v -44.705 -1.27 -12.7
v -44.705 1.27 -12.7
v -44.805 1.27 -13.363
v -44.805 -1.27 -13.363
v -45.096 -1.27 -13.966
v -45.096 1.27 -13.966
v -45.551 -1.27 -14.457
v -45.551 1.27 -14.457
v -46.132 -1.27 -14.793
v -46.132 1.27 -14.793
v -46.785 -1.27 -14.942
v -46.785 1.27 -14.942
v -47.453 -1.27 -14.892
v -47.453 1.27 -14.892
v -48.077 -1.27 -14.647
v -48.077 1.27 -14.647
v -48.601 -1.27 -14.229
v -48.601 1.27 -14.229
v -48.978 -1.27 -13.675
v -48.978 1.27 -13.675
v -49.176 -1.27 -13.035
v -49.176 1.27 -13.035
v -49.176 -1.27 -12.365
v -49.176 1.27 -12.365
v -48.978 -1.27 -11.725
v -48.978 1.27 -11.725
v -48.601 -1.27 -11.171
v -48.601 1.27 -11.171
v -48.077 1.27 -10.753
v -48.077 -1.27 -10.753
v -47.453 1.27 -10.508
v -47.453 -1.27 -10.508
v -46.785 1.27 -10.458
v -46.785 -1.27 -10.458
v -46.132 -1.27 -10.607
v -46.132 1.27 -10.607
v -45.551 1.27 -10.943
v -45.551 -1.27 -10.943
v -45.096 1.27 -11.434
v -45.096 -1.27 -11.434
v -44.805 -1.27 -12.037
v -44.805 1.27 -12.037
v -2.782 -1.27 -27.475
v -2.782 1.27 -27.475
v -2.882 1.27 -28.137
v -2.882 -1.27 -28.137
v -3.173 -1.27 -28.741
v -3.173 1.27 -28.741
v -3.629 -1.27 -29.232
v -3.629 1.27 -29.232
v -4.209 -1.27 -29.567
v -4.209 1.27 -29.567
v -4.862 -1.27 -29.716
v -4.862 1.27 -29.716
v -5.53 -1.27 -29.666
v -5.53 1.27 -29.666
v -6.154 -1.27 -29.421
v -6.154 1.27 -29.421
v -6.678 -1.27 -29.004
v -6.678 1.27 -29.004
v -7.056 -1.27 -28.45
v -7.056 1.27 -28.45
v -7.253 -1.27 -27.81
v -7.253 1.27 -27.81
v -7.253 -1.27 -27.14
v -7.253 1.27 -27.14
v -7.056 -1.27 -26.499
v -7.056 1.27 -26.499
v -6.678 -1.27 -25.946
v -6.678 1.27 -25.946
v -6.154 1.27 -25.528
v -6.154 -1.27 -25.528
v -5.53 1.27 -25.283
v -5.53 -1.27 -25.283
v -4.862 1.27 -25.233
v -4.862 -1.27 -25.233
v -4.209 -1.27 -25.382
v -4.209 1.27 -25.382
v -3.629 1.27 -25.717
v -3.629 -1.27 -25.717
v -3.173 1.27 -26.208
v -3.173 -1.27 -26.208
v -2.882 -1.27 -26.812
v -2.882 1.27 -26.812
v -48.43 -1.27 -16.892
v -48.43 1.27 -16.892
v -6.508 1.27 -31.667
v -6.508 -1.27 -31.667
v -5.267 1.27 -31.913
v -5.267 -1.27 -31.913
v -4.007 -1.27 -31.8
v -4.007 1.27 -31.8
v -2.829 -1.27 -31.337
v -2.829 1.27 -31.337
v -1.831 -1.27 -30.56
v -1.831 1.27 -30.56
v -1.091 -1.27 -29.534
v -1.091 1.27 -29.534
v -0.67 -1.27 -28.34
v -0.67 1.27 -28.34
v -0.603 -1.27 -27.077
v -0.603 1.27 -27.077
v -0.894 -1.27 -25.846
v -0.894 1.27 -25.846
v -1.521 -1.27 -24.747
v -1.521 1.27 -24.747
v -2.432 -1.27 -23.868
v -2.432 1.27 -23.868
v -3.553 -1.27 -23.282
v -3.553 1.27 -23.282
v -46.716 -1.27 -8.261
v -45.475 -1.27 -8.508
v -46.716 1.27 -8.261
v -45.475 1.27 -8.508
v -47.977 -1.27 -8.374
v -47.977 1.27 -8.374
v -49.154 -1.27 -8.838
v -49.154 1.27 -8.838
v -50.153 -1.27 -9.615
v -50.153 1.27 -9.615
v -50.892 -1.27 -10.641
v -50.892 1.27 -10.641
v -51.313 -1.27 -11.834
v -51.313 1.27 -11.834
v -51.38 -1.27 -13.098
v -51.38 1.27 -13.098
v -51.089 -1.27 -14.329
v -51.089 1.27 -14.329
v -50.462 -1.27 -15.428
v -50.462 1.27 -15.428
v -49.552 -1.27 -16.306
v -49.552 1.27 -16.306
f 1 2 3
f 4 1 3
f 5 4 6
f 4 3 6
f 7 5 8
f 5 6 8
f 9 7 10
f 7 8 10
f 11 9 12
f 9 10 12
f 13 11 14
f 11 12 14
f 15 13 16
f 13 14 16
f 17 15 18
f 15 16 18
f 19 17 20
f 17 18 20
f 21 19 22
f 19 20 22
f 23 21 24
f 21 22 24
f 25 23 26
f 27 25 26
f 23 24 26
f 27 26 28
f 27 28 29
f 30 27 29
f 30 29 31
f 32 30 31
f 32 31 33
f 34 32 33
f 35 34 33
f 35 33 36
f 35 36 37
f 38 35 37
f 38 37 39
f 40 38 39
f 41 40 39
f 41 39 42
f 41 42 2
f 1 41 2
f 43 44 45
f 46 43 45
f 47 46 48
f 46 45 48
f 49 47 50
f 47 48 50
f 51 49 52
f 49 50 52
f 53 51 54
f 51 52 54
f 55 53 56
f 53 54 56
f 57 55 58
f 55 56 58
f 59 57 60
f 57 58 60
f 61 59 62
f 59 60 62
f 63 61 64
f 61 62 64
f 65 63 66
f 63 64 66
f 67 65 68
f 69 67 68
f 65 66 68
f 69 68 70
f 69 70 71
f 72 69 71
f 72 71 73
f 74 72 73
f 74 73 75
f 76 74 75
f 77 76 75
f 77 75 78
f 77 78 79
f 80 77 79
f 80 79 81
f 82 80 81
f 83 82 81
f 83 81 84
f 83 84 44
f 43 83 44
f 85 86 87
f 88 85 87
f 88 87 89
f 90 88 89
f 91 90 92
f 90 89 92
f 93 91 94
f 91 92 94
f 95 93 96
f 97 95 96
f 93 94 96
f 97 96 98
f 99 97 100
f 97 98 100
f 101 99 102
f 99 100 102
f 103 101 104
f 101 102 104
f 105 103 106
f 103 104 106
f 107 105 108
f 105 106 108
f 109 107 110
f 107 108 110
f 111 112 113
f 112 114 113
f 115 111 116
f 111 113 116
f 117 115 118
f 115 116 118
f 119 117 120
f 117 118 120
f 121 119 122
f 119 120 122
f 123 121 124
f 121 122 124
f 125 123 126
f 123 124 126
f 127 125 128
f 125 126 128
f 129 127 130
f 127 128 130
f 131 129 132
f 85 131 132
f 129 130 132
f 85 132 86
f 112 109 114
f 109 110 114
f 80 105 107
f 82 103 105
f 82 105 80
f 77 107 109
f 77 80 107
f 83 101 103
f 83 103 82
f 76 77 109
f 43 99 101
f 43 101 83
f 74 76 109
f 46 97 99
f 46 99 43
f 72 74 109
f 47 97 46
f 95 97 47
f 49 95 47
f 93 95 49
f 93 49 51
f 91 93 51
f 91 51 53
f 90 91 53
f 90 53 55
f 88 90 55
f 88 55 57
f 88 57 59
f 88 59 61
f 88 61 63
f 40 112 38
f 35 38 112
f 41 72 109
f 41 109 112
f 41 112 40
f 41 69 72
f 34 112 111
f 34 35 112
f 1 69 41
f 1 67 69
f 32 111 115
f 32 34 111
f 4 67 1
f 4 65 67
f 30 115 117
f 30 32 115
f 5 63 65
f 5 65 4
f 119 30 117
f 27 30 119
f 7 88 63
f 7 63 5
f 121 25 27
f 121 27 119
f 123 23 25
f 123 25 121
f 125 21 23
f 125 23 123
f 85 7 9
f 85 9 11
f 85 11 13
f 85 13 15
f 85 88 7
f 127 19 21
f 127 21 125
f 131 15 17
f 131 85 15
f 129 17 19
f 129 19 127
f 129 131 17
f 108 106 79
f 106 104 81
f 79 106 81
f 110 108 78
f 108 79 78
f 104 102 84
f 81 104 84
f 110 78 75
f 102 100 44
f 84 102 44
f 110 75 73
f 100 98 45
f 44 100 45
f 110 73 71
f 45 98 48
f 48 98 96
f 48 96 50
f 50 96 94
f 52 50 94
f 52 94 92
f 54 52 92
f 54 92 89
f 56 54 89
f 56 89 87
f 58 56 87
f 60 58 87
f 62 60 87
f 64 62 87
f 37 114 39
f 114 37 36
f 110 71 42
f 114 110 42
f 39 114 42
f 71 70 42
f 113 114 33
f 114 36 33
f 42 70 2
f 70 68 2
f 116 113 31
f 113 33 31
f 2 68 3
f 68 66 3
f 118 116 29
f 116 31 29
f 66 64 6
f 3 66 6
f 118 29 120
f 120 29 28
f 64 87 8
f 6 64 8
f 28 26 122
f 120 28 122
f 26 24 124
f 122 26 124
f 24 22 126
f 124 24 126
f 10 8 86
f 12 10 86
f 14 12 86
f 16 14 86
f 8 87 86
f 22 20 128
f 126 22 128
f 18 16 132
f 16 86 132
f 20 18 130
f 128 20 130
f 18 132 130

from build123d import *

# Parameters (mm, degrees)
BOSS_EXTRUDE1_DEPTH = 1.27
CUT_EXTRUDE1_REACH  = 4.54
SKETCH3_R           = 2.2479


with BuildPart() as part:
    # Sketch2 → Boss-Extrude1 (new body, symmetric)
    with BuildSketch(Plane(origin=(0, 0, 0), x_dir=(1, 0, 0), z_dir=(0, 1, 0))):
        with BuildLine():
            ThreePointArc((-6.507736872, 31.666944674), (-0.838000837, 28.952143892), (-3.552801619, 23.282407856))
            Line((-3.552801619, 23.282407856), (-45.475485708, 8.507731591))
            ThreePointArc((-45.475485708, 8.507731591), (-51.145221744, 11.222532373), (-48.430420961, 16.892268409))
            Line((-48.430420961, 16.892268409), (-6.507736872, 31.666944674))
        make_face()
    extrude(amount=BOSS_EXTRUDE1_DEPTH, both=True)

    # Sketch3 → Cut-Extrude1 (cut, up to next)
    with BuildSketch(Plane(origin=(0, 1.27, 0), x_dir=(1, 0, 0), z_dir=(0, 1, 0)), mode=Mode.PRIVATE) as cut_extrude1_sk1:
        with Locations((-5.030269245, 27.474676265)):
            Circle(SKETCH3_R)
    cut_extrude1_tool1 = extrude(cut_extrude1_sk1.sketch, amount=-CUT_EXTRUDE1_REACH, mode=Mode.PRIVATE) & part.part
    add(cut_extrude1_tool1.solids().sort_by_distance((-5.030269, 1.27, -27.474676))[0], mode=Mode.SUBTRACT)
    # Sketch3 → Cut-Extrude1 (cut, up to next)
    with BuildSketch(Plane(origin=(0, 1.27, 0), x_dir=(1, 0, 0), z_dir=(0, 1, 0)), mode=Mode.PRIVATE) as cut_extrude1_sk2:
        with Locations((-46.952953335, 12.7)):
            Circle(SKETCH3_R)
    cut_extrude1_tool2 = extrude(cut_extrude1_sk2.sketch, amount=-CUT_EXTRUDE1_REACH, mode=Mode.PRIVATE) & part.part
    add(cut_extrude1_tool2.solids().sort_by_distance((-46.952953, 1.27, -12.7))[0], mode=Mode.SUBTRACT)


solid = part.part
